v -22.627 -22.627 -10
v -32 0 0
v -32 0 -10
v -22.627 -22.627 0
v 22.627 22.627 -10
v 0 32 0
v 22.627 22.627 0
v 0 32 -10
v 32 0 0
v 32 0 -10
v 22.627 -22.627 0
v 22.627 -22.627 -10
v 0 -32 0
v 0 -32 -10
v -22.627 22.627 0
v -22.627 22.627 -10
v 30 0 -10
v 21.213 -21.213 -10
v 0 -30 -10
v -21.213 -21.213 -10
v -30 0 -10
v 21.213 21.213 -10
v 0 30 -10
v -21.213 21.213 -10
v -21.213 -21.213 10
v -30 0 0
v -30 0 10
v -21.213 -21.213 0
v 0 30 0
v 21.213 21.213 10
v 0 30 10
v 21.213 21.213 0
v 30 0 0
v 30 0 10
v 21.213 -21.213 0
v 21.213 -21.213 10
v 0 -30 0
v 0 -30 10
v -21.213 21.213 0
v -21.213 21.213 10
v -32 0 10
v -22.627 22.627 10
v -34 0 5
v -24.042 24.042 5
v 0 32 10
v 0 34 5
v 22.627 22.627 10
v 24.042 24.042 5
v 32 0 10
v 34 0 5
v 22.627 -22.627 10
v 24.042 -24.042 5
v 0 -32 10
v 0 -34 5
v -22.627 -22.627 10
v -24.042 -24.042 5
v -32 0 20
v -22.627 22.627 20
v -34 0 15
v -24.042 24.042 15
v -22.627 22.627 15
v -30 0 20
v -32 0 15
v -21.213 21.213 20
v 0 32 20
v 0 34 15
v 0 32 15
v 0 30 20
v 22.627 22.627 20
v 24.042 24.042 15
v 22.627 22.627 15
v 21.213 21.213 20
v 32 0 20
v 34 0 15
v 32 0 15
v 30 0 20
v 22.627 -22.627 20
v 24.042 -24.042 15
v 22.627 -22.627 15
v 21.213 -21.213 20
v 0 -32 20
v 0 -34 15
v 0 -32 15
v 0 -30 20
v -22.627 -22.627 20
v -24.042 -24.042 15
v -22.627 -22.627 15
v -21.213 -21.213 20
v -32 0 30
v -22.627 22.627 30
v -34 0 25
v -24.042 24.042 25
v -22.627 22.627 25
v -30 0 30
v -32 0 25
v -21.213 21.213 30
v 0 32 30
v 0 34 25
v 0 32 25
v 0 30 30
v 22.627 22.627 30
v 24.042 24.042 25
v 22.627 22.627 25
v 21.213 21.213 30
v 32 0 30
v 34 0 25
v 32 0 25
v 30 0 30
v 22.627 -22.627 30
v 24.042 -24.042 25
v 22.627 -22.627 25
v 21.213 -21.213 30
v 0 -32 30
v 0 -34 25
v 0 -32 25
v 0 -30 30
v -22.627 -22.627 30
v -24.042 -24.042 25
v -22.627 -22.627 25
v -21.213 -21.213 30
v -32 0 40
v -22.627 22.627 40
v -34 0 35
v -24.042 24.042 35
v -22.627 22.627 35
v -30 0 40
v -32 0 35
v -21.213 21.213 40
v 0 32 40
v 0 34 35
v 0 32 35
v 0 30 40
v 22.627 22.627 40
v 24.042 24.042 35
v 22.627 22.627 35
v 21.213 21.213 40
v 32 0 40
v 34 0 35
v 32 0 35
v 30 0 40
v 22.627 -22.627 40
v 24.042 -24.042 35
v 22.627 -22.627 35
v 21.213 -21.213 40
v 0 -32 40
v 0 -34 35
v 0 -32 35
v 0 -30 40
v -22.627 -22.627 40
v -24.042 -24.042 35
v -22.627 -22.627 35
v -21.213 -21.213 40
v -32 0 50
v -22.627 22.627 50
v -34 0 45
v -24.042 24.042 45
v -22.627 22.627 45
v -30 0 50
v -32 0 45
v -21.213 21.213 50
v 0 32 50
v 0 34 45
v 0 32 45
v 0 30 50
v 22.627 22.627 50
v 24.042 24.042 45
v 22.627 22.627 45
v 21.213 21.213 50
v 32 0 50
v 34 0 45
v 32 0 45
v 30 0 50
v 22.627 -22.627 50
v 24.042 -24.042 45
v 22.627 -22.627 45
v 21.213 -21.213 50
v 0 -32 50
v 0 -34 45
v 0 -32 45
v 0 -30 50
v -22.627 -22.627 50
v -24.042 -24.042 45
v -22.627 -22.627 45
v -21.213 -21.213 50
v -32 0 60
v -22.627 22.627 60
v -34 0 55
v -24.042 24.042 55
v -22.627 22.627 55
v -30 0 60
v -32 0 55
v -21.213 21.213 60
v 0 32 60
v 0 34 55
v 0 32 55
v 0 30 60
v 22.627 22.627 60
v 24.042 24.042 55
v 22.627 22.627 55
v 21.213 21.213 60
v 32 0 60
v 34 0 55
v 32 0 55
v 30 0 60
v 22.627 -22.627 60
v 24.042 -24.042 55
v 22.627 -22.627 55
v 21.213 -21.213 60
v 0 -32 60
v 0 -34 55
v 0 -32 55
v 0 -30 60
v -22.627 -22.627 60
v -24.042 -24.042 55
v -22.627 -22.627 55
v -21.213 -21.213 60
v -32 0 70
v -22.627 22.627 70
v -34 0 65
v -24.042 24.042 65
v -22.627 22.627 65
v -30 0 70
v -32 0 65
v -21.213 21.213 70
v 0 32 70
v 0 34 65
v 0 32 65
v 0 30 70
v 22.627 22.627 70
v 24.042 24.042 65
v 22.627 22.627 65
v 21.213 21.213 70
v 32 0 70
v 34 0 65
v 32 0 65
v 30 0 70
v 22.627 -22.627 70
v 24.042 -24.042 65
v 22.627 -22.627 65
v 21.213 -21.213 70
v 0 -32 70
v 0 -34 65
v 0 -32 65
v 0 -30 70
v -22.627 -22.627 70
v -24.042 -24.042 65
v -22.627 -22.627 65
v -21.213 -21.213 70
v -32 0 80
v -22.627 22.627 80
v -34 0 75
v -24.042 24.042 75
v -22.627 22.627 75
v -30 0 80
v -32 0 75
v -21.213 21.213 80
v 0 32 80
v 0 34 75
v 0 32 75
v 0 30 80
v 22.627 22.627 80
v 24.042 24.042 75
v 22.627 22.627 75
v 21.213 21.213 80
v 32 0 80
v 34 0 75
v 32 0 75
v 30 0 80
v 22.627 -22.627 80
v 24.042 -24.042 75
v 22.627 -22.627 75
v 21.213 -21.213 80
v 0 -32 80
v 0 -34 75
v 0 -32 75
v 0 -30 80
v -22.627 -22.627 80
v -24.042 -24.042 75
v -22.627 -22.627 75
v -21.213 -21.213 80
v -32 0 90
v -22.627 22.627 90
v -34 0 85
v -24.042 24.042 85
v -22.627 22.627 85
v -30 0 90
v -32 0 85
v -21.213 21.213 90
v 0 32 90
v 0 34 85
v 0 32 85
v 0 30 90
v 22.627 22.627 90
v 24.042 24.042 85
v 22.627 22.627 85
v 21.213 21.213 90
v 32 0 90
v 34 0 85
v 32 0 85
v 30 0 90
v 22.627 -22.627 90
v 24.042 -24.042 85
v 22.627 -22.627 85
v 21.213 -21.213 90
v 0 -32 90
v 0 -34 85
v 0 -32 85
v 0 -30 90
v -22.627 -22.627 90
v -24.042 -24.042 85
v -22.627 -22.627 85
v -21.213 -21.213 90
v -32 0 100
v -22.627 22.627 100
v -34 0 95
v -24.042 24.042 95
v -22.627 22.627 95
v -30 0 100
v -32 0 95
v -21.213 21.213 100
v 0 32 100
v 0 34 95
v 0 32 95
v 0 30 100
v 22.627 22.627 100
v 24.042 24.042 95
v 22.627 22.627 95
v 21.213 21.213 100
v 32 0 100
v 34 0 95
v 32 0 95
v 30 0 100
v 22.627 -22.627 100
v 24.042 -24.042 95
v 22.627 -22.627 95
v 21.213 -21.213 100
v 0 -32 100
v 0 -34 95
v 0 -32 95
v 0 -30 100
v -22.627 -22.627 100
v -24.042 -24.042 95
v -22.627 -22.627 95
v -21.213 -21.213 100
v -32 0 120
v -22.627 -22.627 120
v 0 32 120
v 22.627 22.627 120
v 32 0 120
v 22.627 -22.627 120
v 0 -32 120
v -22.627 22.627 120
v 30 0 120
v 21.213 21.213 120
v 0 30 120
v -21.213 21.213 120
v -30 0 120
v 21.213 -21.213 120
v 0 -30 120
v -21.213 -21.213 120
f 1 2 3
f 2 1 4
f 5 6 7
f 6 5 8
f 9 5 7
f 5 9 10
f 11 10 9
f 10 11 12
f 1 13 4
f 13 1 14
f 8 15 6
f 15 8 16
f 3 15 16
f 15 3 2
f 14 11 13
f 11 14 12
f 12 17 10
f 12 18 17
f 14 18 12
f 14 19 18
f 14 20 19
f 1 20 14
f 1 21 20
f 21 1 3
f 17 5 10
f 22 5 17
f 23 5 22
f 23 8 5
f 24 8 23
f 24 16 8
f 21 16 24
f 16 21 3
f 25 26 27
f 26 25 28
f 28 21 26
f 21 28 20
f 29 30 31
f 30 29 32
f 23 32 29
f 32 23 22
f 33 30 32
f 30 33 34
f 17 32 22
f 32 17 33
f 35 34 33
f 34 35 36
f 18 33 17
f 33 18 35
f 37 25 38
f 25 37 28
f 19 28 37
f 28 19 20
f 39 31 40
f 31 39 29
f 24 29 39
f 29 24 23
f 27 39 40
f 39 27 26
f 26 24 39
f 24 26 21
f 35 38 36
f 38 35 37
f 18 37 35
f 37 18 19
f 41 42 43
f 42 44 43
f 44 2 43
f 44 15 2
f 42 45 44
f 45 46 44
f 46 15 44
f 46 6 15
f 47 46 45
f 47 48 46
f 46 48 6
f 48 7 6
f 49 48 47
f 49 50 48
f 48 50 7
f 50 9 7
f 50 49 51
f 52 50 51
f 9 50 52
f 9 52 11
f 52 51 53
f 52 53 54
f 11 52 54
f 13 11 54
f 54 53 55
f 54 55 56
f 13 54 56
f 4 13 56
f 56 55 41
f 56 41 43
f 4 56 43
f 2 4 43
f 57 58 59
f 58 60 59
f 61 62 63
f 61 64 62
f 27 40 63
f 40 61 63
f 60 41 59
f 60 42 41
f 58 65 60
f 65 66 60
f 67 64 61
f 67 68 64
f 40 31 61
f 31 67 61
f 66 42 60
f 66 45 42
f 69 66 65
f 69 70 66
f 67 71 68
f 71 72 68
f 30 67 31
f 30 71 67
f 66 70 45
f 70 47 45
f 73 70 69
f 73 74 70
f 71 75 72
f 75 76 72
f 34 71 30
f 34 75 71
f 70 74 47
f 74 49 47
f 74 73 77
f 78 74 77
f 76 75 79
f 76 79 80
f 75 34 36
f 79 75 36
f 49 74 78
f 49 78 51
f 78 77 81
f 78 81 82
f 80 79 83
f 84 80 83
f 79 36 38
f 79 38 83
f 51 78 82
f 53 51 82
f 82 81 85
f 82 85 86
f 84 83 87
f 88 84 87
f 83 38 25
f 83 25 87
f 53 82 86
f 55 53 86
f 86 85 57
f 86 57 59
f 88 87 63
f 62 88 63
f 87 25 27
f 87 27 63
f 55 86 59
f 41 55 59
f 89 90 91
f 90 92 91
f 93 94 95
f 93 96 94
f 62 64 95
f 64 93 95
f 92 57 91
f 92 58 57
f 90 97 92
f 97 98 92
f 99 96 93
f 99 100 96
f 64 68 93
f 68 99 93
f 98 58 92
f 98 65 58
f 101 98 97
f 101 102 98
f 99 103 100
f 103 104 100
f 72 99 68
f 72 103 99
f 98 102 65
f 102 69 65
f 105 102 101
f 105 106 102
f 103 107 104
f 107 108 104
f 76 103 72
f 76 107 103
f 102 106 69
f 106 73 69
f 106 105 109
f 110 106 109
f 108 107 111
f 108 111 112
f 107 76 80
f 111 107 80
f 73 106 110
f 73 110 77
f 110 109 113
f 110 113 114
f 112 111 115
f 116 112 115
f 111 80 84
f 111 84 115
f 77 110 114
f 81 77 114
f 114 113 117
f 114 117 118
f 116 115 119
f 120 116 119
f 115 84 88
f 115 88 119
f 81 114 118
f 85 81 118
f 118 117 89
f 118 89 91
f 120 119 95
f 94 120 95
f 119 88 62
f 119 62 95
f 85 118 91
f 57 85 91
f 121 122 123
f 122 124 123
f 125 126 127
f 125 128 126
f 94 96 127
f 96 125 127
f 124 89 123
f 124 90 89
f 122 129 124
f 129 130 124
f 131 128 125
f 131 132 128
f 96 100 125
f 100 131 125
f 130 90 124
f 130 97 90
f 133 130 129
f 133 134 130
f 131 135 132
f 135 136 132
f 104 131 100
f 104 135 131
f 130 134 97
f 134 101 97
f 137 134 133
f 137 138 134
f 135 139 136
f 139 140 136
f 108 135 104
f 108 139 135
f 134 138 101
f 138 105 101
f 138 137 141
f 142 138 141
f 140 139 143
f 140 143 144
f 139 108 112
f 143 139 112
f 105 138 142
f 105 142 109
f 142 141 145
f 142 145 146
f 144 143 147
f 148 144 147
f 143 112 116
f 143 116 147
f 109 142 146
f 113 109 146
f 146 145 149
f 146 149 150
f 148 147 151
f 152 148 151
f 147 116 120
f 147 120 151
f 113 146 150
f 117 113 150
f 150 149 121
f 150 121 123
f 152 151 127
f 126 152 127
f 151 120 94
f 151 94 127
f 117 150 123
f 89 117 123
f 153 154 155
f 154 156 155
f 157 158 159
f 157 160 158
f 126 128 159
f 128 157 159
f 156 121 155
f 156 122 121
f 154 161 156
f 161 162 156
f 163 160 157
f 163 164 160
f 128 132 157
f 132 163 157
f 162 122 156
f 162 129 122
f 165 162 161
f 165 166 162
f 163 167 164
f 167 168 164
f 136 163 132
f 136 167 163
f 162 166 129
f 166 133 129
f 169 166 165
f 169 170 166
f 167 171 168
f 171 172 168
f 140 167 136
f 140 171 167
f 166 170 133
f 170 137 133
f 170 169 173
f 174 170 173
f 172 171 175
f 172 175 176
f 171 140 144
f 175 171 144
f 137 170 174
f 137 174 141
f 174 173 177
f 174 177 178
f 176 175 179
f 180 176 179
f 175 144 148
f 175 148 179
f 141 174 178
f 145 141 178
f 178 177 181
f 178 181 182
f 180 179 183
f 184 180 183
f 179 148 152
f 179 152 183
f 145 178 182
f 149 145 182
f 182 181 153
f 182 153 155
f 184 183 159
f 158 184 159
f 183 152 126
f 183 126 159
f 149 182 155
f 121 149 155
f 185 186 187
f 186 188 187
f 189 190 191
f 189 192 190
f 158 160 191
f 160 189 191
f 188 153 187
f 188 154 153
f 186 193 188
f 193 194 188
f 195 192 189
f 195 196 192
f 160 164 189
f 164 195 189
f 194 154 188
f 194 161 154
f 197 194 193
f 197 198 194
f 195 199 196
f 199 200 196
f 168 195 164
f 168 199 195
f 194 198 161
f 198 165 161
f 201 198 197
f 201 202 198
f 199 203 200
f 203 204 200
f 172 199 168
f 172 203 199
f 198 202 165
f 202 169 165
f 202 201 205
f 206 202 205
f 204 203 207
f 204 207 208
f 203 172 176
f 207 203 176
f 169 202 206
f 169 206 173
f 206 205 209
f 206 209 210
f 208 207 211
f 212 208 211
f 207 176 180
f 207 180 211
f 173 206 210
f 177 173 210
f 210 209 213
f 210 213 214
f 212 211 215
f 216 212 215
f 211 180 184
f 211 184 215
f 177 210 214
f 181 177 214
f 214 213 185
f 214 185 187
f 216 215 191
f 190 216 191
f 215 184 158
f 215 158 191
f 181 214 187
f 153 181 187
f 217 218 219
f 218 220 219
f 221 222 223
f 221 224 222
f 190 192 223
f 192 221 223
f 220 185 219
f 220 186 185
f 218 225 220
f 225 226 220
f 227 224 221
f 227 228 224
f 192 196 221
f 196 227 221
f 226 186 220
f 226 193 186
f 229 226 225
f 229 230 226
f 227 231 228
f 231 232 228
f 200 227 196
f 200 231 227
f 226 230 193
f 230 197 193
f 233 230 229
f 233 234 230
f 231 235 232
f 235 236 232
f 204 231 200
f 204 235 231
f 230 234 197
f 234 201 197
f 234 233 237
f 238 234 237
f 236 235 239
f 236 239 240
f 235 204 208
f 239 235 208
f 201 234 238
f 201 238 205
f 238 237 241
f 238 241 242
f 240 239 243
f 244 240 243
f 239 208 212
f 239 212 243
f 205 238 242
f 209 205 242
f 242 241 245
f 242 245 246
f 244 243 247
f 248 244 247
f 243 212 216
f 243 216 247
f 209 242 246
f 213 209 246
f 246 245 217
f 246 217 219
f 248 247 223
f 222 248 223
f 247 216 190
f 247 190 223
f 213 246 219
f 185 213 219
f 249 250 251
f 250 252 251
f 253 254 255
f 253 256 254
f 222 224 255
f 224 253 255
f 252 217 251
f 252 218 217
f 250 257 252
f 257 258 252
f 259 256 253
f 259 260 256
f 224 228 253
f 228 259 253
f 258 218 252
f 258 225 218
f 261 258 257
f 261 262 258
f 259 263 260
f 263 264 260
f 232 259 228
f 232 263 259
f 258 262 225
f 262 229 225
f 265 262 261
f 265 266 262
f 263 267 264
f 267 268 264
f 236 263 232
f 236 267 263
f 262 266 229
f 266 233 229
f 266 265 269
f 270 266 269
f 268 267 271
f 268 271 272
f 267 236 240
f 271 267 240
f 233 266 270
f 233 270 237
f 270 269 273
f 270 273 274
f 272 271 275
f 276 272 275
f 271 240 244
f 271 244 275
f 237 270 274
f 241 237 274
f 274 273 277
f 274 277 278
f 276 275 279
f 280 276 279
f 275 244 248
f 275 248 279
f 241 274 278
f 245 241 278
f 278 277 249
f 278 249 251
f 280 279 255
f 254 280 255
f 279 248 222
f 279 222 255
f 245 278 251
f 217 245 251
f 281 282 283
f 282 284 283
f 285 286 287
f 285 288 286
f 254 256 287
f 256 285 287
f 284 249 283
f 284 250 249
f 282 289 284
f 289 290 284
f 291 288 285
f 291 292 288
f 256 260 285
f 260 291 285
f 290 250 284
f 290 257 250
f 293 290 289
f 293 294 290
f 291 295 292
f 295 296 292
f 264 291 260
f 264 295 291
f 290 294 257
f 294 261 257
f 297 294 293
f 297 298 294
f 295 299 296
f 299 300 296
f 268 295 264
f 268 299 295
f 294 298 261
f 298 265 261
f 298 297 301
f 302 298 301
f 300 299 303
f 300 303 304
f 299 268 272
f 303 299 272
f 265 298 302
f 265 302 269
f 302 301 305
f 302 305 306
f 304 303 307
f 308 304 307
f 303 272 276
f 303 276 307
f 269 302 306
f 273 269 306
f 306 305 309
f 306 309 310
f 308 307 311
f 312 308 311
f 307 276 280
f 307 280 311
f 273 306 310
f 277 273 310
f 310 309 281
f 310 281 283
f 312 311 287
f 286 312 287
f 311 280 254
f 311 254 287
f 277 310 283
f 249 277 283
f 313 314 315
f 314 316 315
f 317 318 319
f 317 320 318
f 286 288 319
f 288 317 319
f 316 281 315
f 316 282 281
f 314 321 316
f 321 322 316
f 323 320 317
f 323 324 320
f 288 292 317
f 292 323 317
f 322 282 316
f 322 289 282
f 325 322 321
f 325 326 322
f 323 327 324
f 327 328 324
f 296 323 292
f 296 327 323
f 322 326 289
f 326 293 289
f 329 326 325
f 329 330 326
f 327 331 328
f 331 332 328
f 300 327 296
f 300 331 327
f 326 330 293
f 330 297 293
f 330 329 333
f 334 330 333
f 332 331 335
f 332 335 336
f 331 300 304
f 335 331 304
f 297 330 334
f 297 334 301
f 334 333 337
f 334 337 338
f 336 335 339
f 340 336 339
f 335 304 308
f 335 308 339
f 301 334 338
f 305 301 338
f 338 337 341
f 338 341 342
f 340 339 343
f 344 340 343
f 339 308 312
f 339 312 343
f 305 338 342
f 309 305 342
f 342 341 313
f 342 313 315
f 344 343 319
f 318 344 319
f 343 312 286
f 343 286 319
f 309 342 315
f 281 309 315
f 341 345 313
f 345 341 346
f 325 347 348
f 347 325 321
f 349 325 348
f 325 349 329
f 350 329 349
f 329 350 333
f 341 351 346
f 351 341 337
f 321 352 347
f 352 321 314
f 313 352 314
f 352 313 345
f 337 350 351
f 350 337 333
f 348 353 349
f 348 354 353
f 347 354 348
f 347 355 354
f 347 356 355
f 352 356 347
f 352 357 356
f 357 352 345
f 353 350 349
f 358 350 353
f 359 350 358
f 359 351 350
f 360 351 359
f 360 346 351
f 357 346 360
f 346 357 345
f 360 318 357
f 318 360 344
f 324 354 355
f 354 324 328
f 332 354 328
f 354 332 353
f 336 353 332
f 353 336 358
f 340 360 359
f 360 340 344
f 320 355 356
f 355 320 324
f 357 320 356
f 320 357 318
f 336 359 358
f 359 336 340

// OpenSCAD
// 1. Number of folds
// 2. Number of columns
// 3. Angle of the folds
// 4. Thickness of sides/walls
// 5. "Distance between flats"
// 6. Length of lip ends

quality = $preview ? 50 : 200;

/* Begin parameters */
total_folding_height = 100;
number_of_folds = 10; 
number_of_columns = 8;
folding_angle = 45; /* It can either depends on the folding height or on the folding angle */
wall_thickness = 2;
radius = 30;
LipEnd_height = 20;
/* End parameters */

fold_height = total_folding_height / number_of_folds;

/* A trapzeoid is composed of a triangle with a rounded corner */
function TWORHOMBOIDS(x=1, y=1, angle=90) 
= [
    [0,0],
    [x,0],
    [x+x*cos(angle)/sin(angle),y],
    [x,y*2],
    [0,y*2],
    [x*cos(angle)/sin(angle),y]
];

module Folding(number_of_folds) {  
    for(i= [0:number_of_folds-1]){
        translate([0,0,i*fold_height])
        rotate_extrude(angle=360, convexity=10, $fn = number_of_columns)
        translate([radius,0,0]) polygon(TWORHOMBOIDS(wall_thickness,fold_height/2,folding_angle));
    }
}

module LipEnd(height){
    difference() {
        cylinder(h=height,r=radius+wall_thickness,center=true,$fn=number_of_columns);
        cylinder(h=height+1,r=radius,center=true, $fn=number_of_columns);

    } 
}

module Assembly() {
    LipEnd(LipEnd_height);
    Folding(number_of_folds);
    translate([0,0,total_folding_height+LipEnd_height/2])
    LipEnd(LipEnd_height);
}

module main(){
    Assembly();  

}

main();
